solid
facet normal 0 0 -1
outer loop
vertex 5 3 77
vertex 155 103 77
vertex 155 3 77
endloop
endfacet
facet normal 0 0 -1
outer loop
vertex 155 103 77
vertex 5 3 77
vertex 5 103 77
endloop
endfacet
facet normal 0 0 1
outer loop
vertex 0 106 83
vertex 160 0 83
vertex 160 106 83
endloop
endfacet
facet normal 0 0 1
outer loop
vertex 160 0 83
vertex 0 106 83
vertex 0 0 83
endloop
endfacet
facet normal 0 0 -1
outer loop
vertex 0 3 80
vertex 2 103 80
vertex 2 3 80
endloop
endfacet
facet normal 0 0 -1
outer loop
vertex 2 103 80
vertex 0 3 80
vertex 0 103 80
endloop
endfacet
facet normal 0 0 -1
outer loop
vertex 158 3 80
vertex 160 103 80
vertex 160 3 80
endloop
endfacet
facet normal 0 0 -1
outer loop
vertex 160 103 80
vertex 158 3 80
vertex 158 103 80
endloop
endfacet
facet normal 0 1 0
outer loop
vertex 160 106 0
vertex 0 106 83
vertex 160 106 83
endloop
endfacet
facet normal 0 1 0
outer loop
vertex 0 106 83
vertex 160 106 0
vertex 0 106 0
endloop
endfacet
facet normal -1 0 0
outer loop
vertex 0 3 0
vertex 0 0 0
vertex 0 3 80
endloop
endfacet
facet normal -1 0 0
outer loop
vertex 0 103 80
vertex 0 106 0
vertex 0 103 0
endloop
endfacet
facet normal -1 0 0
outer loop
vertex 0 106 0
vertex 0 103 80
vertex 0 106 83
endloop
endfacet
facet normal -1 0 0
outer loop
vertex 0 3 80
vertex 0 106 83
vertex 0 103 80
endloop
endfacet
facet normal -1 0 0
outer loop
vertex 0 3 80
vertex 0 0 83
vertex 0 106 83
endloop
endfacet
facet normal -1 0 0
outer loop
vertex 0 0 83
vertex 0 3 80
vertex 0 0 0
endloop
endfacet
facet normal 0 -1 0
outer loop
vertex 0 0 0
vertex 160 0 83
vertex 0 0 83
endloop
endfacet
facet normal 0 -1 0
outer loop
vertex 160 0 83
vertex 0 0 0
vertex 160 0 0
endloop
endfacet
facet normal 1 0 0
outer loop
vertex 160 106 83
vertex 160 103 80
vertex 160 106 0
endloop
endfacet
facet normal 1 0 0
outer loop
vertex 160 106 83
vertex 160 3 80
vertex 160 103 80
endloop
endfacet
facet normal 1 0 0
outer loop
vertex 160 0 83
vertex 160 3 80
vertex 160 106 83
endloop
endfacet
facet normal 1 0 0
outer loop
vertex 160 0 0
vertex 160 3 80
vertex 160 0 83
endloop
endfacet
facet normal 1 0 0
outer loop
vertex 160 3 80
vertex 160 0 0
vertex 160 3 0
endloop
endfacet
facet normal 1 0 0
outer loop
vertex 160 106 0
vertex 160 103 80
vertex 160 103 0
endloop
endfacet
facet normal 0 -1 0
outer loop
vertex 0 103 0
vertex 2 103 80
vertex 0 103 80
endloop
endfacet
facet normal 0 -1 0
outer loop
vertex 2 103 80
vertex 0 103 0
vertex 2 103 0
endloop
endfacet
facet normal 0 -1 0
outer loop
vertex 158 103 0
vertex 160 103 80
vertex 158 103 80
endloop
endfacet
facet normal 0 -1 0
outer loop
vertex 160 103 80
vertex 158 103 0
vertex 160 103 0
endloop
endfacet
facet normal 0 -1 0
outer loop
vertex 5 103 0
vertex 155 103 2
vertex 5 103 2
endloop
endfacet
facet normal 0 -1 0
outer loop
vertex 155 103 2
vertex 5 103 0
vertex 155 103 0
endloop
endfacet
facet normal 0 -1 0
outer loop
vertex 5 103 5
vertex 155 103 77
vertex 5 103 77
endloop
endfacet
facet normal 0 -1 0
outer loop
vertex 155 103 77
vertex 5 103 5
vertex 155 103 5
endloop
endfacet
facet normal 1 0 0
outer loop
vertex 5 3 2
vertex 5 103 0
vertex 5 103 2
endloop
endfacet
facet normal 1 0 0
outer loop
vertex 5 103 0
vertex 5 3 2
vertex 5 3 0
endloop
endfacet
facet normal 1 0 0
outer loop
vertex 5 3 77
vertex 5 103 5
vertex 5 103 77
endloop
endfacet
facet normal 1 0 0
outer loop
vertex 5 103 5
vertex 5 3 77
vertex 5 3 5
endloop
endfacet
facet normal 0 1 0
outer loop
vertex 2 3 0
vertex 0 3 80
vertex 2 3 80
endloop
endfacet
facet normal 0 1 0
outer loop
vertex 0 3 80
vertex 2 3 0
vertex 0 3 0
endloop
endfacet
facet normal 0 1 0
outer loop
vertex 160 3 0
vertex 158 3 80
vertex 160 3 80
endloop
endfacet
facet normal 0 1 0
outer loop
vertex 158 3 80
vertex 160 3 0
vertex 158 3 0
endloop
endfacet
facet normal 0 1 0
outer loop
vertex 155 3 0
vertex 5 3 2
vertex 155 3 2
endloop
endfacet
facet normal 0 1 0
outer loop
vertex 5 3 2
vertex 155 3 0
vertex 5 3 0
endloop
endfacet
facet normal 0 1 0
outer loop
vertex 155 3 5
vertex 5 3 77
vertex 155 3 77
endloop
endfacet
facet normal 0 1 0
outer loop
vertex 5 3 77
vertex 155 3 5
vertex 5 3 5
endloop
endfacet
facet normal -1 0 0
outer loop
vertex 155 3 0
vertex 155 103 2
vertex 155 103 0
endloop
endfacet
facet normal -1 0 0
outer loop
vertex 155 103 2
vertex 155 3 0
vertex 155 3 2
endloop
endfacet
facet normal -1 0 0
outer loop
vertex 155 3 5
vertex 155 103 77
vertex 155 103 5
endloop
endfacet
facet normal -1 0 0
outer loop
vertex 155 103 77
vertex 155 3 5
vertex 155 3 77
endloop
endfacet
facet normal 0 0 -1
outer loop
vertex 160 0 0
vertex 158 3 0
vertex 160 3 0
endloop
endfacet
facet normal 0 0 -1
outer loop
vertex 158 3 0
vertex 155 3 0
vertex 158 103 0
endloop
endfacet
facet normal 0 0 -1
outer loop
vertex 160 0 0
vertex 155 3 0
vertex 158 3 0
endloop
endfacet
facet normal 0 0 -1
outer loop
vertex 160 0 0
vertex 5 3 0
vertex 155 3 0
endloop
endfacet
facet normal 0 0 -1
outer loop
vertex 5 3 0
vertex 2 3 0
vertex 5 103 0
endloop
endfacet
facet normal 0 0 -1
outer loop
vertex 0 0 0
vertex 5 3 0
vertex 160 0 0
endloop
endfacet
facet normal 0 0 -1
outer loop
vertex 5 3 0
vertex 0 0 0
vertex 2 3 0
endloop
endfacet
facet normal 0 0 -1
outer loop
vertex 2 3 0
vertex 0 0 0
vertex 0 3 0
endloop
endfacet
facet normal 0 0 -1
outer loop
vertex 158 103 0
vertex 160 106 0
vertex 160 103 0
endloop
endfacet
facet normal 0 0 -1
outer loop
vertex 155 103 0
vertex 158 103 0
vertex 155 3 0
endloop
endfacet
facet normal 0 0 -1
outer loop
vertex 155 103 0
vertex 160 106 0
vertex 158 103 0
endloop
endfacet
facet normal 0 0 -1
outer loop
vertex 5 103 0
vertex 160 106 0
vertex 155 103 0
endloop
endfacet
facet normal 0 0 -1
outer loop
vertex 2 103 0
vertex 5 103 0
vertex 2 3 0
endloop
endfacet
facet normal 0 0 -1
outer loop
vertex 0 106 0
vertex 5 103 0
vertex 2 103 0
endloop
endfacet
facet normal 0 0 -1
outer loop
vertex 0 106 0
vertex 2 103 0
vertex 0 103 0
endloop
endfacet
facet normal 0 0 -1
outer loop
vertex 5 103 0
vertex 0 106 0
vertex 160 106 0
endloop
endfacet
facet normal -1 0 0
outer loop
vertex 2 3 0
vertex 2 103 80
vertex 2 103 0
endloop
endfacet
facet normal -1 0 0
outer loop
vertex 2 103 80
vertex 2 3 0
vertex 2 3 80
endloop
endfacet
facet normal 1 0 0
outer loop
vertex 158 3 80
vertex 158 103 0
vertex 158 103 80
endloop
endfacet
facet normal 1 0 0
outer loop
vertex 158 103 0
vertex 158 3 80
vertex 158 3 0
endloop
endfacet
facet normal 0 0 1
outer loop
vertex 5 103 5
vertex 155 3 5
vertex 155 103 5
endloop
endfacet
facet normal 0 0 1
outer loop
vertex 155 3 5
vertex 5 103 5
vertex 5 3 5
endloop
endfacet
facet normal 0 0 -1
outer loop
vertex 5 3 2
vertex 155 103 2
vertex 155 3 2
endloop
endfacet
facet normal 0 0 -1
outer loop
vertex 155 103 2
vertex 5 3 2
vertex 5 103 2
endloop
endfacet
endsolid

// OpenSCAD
//--------------Box V2------------------//
/*--------------------------------------//
**Designer: Kristina Nickerson @
            Basement Laser
**Start: 06-18-2018
**End:   
//--------------------------------------*/

//======================================//
//=============PARAMETERS===============//
//======================================//

//display: 0=3D box, 1=flat
flat    =   0;

//-------------USER INPUT---------------//

//material thickness
t   =   3;

//inside dimensions
Li  =   150;
Wi  =   100;
Hi  =   75;

//tab size
S   =   4*t;

//brace size
B   =   2;

//-----------END USER INPUT-------------//

//edge size
e   =   t+B;

//total dimensions
L   =   Li+2*e;
W   =   Wi+2*t;
H   =   Hi+e;

//======================================//
//=============APPEARANCE===============//
//======================================//

color_front = ("red");
color_back =("green");
color_side_1 =("darkviolet");
color_side_2 = ("deeppink");
color_bottom = ("coral");
color_cover = ("rosybrown");
color_insert = ("blue");
color_pegs = ("orange");

//======================================//
//==============FUNCTIONS===============//
//======================================//

function    func_n(q) = 
    ((q-(2*t)+S)/(2*S));
    
function    func_E(z) = 
    ((z-(floor(func_n(z))*2*S)+S)/2);
    
//======================================//
//===============MODULES================//
//======================================//

module whole_flat() {
    front();
    translate([0,H+B,0])
    back();
    translate([L+e,0,0])
    side_1();
    translate([L+e,H+B,0])
    side_2();
    translate([e,2*H+B+e])
    bottom(); 
    translate([-L-t,0,0])
    lid_flat();
}

module  whole_box() {
    translate([0,0,H-t])
    lid_box(); 
   
    color(color_back)
    translate([0,W,0])
    rotate([90,0,0])
    linear_extrude(t)
    back(); 
    
    color(color_bottom)
    translate([e,t,2])
    linear_extrude(t)
    bottom(); 
    
    color(color_side_1)
    translate([2,t,0])
    rotate([90,0,90])
    linear_extrude(t)
    side_1(); 
    
    color(color_side_2)
    translate([L-e,t,0])
    rotate([90,0,90])
    linear_extrude(t)
    side_2(); 
    
    color(color_front)
    translate([0,t,0])
    rotate([90,0,0])
    linear_extrude(t)
    front(); 
}

module  front() {
    E1  =   func_E(Li);
    E2  =   func_E(Hi);
    color(color_front)
    difference()    {
        square([L,H]);
        translate([e,0,0])
        hi_tabs(E1,Li,B);
        translate([0,e,0])
        vi_tabs(E2,Hi,[B,L-t-B]);
    }
}

module  back()   {
    color(color_back)
    front();
}

module  side_1()    {
    E1  =   func_E(Wi);
    E2  =   func_E(Hi);
    color(color_side_1)
    union() {
        difference()    {
            square([Wi,H]);
            hi_tabs(E1,Wi,B);
        }
        translate([0,e,0])
        vo_tabs(E2,Hi,[-t,Wi-t]);
    }
}

module  side_2()    {
    color(color_side_2)
    side_1();
}

module  bottom()    {
    E1  =   func_E(Li);
    E2  =   func_E(Wi);
    color(color_bottom)
    union() {
        square([Li,Wi]);
        translate([0,-t,0])
        ho_tabs(E1,Li,[0,Wi]);
        translate([-t,0,0])
        vo_tabs(E2,Wi,[0,Li]);
    }
}

module  lid_flat()   {
    cover();
    translate([0,W+t,0])
    translate([e,t,0])
    insert();
    translate([e,2*W+t,0])
    pegs_flat();
}

module  lid_box()   {
    color(color_pegs)
    translate([e,t,0])
    linear_extrude(2*t)
    pegs_box();
    
    color(color_cover)
    translate([0,0,t])
    linear_extrude(t)
    cover();
    
    color(color_insert)
    translate([e,t,0])
    linear_extrude(t)
    insert(); 
}

module  cover() {
    color(color_cover)
    difference()    {
        square([L,W]);
        for(x  =  [e+3*t,L-e-4*t], 
            y =[4*t,W-8*t])
        translate([x,y])
        square([t,4*t]);
    }
}

module  insert()    {
    color(color_insert)
    difference()    {
        square([Li,Wi]);
        for(x  =  [3*t,Li-4*t], 
            y =[3*t,Wi-7*t])
        translate([x,y])
        square([t,4*t]);
    }
}

module  pegs_flat()  {
    color("blue")
    for(x=[0:2*t+1:3*(2*t+1)])
        translate([x,0])
    square([2*t,4*t]);
}

module  pegs_box()  {
    color(color_pegs)
    for(x  =  [3*t,Li-4*t], 
            y =[3*t,Wi-7*t])
    translate([x,y])
    square([t,4*t]);
}
//======================================//
//==========REPEATING MODULES==========//
//======================================//

module hi_tabs(E,p,ys)    {
    //edge horizontal inside
            for(x=[E:2*S:p-E],
                y=ys)
            translate([x,y])
            x_tab_i();
        }
     
module  vi_tabs(E,p,xs)    {
        //edge vertical inside
            for(x=xs,
                y=[E:2*S:p-E])
            translate([x,y])
            y_tab_i(); 
        }
        
        module ho_tabs(E,p,ys)    {
    //edge horizontal inside
            for(x=[E:2*S:p-E],
                y=ys)
            translate([x,y])
            x_tab_o();
        }
     
module  vo_tabs(E,p,xs)    {
        //edge vertical inside
            for(x=xs,
                y=[E:2*S:p-E])
            translate([x,y])
            y_tab_o(); 
        }
module  x_tab_o() {
    square([S,t*2]);
}

module x_tab_i()    {
    square([S,t]);
}

module  y_tab_o() {
    square([t*2,S]);
}

module  y_tab_i()   {
    square([t,S]);
}

if (flat)
{
    whole_flat();
}
else
{
    whole_box();
}
